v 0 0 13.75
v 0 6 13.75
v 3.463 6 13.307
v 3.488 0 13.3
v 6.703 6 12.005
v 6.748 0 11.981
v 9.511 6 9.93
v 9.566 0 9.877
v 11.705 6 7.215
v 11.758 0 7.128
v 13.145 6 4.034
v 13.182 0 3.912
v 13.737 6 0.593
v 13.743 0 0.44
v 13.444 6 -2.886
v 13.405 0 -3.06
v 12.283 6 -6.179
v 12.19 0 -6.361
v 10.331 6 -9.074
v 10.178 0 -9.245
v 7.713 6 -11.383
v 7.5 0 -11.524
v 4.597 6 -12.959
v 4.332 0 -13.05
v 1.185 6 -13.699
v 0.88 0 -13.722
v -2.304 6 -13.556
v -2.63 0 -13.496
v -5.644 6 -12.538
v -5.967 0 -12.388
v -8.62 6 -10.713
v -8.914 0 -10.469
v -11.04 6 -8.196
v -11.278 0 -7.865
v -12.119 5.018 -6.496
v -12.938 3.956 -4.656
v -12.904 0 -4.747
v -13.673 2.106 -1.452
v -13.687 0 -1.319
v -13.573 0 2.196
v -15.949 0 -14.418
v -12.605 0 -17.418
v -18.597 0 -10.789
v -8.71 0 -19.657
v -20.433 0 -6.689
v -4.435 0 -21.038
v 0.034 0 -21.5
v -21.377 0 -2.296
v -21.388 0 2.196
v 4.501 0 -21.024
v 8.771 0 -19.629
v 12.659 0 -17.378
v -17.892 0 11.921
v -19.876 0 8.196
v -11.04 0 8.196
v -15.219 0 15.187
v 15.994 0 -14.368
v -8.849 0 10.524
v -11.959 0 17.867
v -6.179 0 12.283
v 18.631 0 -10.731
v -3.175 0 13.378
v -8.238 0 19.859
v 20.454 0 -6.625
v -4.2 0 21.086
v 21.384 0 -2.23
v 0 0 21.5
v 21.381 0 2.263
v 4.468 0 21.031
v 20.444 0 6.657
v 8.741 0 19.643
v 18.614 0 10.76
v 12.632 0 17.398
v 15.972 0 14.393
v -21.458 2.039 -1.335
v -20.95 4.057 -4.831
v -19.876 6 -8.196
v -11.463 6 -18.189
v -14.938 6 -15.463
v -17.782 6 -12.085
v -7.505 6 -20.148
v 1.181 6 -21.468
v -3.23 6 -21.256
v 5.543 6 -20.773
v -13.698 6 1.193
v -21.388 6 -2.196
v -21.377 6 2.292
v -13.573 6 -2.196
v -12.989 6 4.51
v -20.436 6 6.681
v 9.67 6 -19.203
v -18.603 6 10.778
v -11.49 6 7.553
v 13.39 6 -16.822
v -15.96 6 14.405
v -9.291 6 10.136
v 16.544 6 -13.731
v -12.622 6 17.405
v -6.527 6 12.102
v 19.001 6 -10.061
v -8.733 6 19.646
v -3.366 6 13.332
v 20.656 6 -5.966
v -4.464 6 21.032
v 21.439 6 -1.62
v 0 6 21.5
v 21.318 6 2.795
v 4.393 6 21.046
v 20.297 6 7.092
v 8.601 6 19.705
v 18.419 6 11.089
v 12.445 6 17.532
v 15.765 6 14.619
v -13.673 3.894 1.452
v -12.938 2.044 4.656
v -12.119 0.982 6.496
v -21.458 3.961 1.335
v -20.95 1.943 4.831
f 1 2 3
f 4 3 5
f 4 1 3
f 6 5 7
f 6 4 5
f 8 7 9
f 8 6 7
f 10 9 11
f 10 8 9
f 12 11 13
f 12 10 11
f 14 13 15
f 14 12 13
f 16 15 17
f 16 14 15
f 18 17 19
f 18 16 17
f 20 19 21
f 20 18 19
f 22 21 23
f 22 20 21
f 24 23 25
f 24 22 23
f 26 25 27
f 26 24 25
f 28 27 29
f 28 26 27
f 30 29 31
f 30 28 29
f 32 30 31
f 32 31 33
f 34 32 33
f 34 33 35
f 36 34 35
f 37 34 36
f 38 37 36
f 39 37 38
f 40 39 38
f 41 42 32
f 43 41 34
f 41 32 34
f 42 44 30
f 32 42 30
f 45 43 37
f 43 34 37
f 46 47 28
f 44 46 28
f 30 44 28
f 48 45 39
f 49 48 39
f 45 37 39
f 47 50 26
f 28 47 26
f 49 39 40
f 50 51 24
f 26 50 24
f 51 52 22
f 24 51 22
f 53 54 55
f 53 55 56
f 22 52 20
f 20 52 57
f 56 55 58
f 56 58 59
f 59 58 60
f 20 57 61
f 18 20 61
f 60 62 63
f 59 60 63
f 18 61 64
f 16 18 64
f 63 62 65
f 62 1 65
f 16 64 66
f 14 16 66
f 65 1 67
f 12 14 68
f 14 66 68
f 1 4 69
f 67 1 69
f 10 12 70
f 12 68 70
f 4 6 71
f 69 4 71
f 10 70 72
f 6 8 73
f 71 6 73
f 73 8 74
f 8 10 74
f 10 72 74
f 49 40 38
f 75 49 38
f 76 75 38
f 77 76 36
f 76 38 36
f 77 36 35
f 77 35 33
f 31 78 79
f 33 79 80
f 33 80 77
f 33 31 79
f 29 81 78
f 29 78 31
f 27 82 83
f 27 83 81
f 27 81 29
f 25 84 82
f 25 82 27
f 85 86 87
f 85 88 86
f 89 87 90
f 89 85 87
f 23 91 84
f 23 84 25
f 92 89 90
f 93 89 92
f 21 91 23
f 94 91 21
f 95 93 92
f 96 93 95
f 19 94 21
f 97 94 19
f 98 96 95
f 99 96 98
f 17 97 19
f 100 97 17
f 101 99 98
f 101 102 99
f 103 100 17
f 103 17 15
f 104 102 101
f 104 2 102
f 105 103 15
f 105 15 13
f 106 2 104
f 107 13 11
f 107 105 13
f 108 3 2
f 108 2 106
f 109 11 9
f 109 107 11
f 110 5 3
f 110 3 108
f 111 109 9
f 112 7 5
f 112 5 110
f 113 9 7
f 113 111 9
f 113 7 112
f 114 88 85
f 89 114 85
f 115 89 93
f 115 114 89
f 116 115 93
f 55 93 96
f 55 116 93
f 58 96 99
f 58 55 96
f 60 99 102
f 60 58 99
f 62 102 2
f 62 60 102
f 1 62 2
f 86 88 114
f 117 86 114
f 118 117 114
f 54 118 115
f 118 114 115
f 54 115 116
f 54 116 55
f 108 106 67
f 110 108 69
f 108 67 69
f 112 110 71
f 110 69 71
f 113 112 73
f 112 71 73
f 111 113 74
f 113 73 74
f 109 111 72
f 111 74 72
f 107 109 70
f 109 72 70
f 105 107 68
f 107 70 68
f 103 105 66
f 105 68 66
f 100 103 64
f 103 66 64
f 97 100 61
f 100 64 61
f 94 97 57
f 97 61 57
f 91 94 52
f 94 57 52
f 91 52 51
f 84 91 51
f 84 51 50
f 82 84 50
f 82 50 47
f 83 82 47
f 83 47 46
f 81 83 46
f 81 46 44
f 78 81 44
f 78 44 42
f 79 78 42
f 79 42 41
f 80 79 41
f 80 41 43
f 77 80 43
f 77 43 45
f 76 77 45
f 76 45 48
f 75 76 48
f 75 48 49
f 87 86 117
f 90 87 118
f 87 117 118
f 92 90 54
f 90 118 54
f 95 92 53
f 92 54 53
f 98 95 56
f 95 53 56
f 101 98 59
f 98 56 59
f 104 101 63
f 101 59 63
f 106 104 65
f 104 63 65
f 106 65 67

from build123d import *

# Parameters (mm, degrees)
SKETCH1_R      = 21.5
SKETCH1_R_2    = 13.75
EXTRUDE1_DEPTH = 6
EXTRUDE2_DEPTH = 31.991934435


with BuildPart() as part:
    # Sketch1 → Extrude1 (new body)
    with BuildSketch(Plane(origin=(0, 0, 0), x_dir=(1, 0, 0), z_dir=(0, 1, 0))):
        with Locations(Location((0, 0, 0), (0, 0, 270))):
            Circle(SKETCH1_R)
        with Locations(Location((0, 0, 0), (0, 0, 270))):
            Circle(SKETCH1_R_2, mode=Mode.SUBTRACT)
    extrude(amount=EXTRUDE1_DEPTH)

    # Sketch2 → Extrude2 (cut, through all)
    with BuildSketch(Plane(origin=(0, 0, 0), x_dir=(0, 0, -1), z_dir=(1, 0, 0))):
        Polygon((-8.196152423, 0), (-2.196152423, 0), (8.196152423, 6), (2.196152423, 6), align=None)
    extrude(amount=-EXTRUDE2_DEPTH, mode=Mode.SUBTRACT)


solid = part.part
